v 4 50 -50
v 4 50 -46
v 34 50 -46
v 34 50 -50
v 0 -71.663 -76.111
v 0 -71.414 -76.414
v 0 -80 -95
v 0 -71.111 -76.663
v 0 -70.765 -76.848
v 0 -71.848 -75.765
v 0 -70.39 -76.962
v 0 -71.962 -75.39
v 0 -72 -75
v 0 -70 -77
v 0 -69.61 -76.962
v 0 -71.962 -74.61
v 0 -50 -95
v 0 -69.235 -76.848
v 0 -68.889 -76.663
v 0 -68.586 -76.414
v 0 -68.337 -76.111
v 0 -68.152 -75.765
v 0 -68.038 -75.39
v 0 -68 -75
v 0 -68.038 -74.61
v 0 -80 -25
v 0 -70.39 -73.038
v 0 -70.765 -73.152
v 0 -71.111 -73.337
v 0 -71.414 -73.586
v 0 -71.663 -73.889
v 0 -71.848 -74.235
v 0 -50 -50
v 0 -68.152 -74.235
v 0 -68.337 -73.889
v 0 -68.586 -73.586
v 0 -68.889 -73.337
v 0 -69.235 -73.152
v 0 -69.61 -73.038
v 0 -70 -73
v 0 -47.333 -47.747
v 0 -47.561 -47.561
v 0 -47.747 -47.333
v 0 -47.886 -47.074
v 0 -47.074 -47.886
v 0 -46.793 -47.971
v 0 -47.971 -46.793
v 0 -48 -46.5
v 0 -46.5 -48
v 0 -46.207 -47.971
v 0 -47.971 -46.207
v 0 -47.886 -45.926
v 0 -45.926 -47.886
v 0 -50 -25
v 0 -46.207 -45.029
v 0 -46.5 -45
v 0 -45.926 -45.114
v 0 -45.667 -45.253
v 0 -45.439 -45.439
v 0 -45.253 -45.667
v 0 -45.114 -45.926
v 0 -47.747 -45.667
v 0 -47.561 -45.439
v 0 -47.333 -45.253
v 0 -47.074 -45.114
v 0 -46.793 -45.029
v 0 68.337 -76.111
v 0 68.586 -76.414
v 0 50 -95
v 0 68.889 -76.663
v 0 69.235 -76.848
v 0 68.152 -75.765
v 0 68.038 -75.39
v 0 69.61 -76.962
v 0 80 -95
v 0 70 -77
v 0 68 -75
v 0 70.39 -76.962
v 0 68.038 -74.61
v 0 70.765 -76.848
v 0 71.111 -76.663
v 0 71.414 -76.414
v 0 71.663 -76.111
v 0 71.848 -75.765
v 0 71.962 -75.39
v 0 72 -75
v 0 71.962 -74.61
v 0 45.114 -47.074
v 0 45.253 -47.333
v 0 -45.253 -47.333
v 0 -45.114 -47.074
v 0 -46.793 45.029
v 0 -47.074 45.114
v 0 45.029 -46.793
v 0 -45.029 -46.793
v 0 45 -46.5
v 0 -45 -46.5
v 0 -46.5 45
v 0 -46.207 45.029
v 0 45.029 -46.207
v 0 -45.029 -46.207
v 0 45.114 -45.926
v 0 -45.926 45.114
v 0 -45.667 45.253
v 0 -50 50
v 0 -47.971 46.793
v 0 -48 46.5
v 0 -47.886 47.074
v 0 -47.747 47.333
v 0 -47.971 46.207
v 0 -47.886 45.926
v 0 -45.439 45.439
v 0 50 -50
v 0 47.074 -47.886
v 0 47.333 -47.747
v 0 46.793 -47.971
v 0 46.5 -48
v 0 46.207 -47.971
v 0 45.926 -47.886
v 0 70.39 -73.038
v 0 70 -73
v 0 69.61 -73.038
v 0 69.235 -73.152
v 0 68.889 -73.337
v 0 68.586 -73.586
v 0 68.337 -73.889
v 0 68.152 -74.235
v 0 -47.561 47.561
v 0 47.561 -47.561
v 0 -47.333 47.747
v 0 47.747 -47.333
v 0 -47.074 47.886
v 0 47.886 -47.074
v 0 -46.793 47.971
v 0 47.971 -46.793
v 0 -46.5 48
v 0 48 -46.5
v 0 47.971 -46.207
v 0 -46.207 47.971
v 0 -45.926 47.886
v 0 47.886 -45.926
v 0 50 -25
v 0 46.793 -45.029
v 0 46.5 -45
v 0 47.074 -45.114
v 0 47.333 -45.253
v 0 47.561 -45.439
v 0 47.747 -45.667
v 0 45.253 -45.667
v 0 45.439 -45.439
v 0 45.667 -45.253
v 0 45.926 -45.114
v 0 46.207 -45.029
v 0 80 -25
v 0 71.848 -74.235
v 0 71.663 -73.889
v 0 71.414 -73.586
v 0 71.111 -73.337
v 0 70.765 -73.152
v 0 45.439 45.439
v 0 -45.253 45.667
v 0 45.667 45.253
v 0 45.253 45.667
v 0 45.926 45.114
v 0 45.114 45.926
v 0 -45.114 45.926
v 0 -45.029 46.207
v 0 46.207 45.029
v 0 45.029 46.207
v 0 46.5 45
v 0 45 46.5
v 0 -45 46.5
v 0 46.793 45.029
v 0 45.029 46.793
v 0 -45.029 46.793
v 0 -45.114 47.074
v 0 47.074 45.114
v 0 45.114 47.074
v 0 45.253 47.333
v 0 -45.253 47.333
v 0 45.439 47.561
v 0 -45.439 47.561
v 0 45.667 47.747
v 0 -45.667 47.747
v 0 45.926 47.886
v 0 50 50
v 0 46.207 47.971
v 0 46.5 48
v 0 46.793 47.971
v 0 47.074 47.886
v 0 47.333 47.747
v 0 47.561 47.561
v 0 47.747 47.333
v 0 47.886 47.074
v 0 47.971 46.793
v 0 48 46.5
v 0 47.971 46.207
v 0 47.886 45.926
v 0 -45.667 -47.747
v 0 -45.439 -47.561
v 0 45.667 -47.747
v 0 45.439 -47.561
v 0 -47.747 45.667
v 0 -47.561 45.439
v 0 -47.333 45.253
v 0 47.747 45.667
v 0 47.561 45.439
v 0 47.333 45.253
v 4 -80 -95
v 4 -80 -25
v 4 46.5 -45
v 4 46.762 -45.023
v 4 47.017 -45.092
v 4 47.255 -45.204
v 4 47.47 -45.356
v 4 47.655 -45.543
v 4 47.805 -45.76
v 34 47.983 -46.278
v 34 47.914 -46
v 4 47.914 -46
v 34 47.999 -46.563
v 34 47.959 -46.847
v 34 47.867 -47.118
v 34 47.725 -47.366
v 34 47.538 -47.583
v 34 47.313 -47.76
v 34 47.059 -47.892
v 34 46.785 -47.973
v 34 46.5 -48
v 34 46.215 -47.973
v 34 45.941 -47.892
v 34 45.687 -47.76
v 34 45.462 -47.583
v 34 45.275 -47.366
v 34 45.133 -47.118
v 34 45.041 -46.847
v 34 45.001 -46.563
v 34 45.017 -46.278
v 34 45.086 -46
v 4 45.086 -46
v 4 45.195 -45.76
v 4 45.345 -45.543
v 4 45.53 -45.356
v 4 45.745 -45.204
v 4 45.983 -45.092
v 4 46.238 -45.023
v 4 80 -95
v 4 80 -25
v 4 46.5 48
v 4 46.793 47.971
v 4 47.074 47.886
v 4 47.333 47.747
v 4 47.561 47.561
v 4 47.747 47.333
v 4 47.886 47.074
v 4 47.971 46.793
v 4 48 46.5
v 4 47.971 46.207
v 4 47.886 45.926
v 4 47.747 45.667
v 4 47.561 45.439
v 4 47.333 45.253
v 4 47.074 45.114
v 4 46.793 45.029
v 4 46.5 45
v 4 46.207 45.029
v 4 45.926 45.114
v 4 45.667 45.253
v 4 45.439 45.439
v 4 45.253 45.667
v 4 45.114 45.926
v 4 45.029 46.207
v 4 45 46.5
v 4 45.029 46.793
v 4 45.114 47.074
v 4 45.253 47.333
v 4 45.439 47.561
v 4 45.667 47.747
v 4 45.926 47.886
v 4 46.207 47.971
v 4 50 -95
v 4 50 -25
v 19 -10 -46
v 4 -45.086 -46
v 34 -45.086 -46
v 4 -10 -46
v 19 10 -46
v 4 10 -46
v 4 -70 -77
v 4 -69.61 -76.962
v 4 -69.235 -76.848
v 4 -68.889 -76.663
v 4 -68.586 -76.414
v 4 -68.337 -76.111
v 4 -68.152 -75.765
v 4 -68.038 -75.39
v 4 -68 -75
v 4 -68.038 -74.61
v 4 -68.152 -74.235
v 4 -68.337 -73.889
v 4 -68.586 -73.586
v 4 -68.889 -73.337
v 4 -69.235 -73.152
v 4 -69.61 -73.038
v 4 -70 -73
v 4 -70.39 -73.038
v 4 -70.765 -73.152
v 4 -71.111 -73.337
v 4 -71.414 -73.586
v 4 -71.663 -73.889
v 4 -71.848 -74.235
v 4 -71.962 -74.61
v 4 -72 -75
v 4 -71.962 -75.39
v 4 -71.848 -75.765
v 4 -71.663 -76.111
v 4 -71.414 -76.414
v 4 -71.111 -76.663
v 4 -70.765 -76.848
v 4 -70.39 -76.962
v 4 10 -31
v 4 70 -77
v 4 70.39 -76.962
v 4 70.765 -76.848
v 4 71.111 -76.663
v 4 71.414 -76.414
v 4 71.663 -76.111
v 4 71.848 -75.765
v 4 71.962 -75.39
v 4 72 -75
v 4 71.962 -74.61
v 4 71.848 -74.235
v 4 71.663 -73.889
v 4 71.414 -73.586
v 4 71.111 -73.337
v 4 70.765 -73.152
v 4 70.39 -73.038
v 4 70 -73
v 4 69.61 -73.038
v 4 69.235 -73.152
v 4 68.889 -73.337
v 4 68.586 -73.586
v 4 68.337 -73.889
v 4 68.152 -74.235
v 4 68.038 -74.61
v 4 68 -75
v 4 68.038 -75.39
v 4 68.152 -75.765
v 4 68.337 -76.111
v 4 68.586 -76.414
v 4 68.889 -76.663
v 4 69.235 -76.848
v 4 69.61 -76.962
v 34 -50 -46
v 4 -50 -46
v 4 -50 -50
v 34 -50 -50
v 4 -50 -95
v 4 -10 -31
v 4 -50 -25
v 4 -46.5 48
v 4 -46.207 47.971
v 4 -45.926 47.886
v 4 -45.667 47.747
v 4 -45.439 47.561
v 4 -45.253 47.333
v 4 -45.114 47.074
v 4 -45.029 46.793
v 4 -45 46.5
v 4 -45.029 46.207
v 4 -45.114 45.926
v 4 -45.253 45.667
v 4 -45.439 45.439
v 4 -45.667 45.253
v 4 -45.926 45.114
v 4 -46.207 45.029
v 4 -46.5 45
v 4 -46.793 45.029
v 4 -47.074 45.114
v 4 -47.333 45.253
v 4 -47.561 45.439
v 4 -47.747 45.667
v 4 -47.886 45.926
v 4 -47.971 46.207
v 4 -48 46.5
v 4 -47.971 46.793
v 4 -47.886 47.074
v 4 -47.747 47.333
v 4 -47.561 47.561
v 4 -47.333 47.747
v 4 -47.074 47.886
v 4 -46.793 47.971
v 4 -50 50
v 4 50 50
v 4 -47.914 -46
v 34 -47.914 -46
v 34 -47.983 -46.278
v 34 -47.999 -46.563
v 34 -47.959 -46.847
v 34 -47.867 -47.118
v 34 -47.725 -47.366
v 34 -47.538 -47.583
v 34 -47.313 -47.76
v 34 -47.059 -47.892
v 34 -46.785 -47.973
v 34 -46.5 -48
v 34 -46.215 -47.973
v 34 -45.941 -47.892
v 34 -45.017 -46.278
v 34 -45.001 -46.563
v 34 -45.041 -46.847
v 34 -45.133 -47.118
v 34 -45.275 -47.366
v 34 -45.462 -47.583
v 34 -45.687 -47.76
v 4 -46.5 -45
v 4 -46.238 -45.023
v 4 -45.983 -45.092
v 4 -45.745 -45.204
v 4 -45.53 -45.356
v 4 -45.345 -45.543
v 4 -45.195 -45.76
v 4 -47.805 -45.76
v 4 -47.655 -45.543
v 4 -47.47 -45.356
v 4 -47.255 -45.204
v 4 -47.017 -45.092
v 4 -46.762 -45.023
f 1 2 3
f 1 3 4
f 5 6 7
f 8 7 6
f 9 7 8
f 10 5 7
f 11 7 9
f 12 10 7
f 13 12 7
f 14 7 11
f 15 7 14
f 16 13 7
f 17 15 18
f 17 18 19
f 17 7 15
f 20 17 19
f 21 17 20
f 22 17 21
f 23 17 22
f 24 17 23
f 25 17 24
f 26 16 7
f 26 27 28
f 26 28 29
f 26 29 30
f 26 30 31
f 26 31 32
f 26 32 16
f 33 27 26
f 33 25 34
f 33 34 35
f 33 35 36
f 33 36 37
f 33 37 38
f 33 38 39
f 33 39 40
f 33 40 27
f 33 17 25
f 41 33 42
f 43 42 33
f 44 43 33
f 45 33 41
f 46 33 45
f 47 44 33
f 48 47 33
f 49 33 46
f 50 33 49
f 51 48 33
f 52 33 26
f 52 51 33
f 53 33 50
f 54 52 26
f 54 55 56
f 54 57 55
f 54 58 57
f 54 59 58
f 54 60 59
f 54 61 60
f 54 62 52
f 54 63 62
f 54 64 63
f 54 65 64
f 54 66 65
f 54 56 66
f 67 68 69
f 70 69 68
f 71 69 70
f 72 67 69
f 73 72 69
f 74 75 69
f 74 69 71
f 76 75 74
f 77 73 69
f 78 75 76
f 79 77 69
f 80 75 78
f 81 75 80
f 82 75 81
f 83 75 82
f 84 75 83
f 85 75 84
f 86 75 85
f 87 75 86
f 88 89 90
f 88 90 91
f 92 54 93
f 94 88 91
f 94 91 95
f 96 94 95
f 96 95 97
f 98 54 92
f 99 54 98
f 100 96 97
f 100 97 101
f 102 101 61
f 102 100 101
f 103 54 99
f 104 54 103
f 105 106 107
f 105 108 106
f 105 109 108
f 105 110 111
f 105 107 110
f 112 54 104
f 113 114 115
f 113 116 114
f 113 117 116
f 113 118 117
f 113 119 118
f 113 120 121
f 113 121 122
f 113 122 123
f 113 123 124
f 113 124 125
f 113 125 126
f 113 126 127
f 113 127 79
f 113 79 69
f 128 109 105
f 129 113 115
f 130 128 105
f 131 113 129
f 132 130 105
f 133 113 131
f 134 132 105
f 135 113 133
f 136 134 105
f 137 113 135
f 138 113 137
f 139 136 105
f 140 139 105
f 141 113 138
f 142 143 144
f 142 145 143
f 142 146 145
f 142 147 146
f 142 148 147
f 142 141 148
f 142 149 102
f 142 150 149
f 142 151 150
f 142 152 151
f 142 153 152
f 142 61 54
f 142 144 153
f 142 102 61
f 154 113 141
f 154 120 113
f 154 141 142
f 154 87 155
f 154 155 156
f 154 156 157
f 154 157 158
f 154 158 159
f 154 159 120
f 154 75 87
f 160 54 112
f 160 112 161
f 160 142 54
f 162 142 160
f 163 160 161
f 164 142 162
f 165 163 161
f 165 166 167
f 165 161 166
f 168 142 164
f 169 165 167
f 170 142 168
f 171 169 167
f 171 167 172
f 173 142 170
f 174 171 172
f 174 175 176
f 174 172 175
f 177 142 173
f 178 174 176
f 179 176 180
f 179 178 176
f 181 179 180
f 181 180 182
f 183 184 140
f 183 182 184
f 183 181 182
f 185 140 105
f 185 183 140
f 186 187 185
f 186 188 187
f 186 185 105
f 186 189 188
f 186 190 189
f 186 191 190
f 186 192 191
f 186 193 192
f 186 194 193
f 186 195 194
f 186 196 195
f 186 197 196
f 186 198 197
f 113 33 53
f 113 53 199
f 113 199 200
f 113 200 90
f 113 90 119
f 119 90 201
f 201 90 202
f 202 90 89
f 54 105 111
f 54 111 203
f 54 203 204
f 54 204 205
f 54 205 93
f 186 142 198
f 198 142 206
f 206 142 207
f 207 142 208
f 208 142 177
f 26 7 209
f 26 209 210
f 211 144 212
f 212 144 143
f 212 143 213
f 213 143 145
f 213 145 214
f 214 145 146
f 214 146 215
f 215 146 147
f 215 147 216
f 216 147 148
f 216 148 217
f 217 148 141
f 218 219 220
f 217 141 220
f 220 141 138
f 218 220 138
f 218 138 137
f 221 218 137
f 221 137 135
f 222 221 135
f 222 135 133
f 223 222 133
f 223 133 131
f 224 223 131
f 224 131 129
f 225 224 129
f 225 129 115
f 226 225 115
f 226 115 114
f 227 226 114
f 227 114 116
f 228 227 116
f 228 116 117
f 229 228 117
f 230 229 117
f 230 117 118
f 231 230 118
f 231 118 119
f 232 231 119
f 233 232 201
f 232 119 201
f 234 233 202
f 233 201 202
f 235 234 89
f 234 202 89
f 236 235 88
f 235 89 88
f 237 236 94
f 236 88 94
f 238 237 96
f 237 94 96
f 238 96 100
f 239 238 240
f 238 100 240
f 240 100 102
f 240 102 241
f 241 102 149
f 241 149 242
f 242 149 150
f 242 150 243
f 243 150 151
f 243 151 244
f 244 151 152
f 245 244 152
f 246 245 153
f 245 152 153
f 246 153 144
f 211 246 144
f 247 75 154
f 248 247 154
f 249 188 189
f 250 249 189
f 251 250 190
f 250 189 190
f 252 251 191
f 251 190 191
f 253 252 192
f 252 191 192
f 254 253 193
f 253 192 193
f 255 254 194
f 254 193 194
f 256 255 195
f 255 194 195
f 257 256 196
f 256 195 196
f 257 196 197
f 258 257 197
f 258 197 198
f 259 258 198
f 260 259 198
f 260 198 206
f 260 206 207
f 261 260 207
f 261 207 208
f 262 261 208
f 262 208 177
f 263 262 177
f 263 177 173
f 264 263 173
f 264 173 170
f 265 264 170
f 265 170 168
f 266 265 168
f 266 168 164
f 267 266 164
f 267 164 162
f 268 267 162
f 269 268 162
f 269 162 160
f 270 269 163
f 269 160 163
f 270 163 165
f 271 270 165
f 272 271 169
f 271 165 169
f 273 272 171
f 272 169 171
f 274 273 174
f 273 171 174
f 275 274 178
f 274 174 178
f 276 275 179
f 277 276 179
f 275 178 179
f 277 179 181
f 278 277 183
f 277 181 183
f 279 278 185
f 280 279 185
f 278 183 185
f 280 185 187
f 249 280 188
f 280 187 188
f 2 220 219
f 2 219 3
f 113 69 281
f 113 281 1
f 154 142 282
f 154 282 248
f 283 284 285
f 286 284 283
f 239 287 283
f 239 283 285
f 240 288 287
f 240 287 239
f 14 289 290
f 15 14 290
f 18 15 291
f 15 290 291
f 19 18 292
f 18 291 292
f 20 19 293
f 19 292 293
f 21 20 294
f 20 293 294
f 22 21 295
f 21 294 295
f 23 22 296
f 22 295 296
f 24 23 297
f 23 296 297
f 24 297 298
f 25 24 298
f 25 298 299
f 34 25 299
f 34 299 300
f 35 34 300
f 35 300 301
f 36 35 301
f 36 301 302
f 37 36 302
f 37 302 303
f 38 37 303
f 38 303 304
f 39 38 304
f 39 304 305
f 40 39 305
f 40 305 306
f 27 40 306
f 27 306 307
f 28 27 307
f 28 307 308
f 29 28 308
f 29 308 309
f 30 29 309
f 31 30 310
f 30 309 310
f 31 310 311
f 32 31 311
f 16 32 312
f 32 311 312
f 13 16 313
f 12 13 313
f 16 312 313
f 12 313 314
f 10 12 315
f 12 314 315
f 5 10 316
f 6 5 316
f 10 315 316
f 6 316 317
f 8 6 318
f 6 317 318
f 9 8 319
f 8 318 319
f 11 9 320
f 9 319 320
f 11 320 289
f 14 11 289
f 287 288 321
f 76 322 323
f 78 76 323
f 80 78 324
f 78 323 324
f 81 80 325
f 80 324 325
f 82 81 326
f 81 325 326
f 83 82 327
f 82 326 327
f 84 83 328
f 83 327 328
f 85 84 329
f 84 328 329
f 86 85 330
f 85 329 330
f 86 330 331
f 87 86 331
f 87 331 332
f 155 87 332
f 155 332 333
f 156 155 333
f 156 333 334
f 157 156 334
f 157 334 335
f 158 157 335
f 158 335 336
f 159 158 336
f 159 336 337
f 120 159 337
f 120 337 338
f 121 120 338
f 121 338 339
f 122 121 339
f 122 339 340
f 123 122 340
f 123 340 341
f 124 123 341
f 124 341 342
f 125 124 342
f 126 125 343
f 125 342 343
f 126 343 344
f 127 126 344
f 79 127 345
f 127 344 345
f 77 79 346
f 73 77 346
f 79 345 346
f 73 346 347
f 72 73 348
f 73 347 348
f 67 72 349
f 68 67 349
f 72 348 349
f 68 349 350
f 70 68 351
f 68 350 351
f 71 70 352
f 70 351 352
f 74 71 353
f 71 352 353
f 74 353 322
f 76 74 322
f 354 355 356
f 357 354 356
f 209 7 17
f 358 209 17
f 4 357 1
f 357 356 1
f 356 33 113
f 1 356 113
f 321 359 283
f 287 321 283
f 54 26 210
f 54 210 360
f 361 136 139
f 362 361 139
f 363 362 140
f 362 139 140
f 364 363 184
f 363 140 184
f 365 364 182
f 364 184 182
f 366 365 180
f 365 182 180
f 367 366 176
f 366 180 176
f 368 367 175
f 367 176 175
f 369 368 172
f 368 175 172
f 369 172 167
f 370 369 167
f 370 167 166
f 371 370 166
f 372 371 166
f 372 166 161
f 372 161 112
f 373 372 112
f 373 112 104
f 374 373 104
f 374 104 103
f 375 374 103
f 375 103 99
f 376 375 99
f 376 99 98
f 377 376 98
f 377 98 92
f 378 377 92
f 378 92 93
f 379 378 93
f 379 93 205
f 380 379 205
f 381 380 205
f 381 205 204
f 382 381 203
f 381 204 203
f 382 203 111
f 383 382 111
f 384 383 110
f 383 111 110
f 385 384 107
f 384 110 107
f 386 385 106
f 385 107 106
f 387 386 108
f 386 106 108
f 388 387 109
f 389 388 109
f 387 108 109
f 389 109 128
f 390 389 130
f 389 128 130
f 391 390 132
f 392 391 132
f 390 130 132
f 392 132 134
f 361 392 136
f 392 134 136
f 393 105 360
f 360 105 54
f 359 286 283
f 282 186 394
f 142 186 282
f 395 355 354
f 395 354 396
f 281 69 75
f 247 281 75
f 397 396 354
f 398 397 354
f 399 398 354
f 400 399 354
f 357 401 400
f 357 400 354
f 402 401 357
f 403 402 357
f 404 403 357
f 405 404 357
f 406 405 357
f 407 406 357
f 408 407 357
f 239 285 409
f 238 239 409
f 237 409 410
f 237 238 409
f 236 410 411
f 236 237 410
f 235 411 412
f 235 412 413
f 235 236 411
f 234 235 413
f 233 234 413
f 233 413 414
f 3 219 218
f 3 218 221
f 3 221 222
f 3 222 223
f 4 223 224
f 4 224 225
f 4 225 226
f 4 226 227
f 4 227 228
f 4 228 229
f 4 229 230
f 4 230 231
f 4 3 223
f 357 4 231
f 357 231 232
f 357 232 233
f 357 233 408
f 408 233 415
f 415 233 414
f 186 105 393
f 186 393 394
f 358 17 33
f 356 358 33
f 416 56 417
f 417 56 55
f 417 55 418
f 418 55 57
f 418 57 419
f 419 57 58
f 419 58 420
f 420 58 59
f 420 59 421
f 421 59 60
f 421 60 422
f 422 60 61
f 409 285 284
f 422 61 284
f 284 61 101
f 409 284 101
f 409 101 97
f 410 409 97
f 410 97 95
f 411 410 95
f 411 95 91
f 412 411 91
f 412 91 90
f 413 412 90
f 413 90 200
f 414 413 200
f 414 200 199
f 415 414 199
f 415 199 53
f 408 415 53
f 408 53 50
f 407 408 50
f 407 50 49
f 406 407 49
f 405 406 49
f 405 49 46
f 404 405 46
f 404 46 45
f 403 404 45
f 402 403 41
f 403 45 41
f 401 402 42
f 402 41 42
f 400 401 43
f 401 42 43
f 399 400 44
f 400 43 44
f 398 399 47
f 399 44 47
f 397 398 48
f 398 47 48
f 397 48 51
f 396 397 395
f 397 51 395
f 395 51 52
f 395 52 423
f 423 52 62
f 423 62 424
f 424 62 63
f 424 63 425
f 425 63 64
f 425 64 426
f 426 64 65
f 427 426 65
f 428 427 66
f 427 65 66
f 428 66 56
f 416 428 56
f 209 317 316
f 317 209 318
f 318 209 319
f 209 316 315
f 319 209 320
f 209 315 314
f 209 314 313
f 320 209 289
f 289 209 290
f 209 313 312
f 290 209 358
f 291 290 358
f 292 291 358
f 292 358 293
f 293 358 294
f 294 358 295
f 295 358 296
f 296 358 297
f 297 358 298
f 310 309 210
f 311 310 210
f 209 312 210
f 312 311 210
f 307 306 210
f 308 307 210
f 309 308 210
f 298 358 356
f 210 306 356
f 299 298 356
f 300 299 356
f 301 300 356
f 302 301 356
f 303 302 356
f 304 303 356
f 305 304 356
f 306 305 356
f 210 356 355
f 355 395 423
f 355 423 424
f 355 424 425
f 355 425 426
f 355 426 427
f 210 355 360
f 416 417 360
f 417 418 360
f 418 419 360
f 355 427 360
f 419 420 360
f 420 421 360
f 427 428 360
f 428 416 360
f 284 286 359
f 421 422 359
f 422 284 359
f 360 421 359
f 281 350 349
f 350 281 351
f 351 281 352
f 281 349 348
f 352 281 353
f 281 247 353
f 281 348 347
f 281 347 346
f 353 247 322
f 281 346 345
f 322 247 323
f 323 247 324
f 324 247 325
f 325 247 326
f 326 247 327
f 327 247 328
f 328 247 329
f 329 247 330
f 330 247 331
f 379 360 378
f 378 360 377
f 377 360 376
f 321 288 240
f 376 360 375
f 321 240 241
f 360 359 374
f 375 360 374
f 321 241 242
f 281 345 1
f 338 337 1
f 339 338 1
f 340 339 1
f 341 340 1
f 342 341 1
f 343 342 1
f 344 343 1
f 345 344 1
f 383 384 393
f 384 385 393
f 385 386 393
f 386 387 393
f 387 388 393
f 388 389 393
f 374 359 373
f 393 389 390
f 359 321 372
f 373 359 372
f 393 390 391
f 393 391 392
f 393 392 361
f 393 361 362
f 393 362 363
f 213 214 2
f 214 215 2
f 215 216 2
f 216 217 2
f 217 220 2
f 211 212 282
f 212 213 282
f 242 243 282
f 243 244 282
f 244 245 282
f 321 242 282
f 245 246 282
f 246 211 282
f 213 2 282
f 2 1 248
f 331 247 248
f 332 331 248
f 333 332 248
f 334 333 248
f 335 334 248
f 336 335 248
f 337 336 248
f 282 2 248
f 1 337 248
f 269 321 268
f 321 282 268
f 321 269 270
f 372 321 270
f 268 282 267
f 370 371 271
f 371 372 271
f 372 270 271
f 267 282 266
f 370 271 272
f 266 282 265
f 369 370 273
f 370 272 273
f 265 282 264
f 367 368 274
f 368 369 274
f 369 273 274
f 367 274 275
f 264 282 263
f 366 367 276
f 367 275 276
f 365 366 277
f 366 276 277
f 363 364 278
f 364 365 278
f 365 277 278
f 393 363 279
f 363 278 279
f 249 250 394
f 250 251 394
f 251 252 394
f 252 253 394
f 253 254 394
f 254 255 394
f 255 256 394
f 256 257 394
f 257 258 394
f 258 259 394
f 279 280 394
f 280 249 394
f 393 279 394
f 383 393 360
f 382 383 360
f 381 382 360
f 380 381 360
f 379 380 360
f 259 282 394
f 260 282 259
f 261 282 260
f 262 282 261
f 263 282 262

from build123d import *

# Parameters (mm, degrees)
SKETCH_1_W           = 100
SKETCH_1_H           = 100
EXTRUDE_1_DEPTH      = 4
SKETCH_2_W           = 4
SKETCH_2_H           = 100
EXTRUDE_2_DEPTH      = 30
SKETCH_3_W           = 70
SKETCH_3_H           = 30
EXTRUDE_3_DEPTH      = 4
SKETCH_4_R           = 2
CUT_EXTRUDE_1_DEPTH  = 128.769323392
SKETCH_5_R           = 1.5
CUT_EXTRUDE_2_DEPTH  = 129.767231857
EXTRUDE_4_DEPTH      = 10
EXTRUDE_4_DEPTH_BACK = 10


with BuildPart() as part:
    # 草图1 → 凸台-拉伸1 (new body)
    with BuildSketch(Plane(origin=(0, 0, 0), x_dir=(0, 0, -1), z_dir=(1, 0, 0))):
        Rectangle(SKETCH_1_W, SKETCH_1_H)
    extrude(amount=EXTRUDE_1_DEPTH)

    # 草图2 → 凸台-拉伸2 (add)
    with BuildSketch(Plane(origin=(4, 0, 0), x_dir=(0, 0, -1), z_dir=(1, 0, 0))):
        with Locations((48, 0)):
            Rectangle(SKETCH_2_W, SKETCH_2_H)
    extrude(amount=EXTRUDE_2_DEPTH)

    # 草图3 → 凸台-拉伸3 (add)
    with BuildSketch(Plane.ZY):
        with Locations((-60, 65)):
            Rectangle(SKETCH_3_W, SKETCH_3_H)
        with Locations((-60, -65)):
            Rectangle(SKETCH_3_W, SKETCH_3_H)
    extrude(amount=-EXTRUDE_3_DEPTH)

    # 草图4 → 切除-拉伸1 (cut, through all)
    with BuildSketch(Plane(origin=(4, 0, 0), x_dir=(0, 0, -1), z_dir=(1, 0, 0))):
        with Locations((75, 70)):
            Circle(SKETCH_4_R)
        with Locations((75, -70)):
            Circle(SKETCH_4_R)
    extrude(amount=-CUT_EXTRUDE_1_DEPTH, mode=Mode.SUBTRACT)

    # 草图5 → 切除-拉伸2 (cut, through all)
    with BuildSketch(Plane.ZY):
        with Locations((46.5, 46.5)):
            Circle(SKETCH_5_R)
        with Locations((-46.5, 46.5)):
            Circle(SKETCH_5_R)
        with Locations((-46.5, -46.5)):
            Circle(SKETCH_5_R)
        with Locations((46.5, -46.5)):
            Circle(SKETCH_5_R)
    extrude(amount=-CUT_EXTRUDE_2_DEPTH, mode=Mode.SUBTRACT)

    # 草图6 → 凸台-拉伸4 (add, two sides: drawn at the far end of the back side and taken through both)
    with BuildSketch(Plane(origin=(0, 0, 0), x_dir=(1, 0, 0), z_dir=(0, 1, 0)).offset(-EXTRUDE_4_DEPTH_BACK)):
        Polygon((4, 31), (19, 46), (4, 46), align=None)
    extrude(amount=EXTRUDE_4_DEPTH + EXTRUDE_4_DEPTH_BACK)


solid = part.part
